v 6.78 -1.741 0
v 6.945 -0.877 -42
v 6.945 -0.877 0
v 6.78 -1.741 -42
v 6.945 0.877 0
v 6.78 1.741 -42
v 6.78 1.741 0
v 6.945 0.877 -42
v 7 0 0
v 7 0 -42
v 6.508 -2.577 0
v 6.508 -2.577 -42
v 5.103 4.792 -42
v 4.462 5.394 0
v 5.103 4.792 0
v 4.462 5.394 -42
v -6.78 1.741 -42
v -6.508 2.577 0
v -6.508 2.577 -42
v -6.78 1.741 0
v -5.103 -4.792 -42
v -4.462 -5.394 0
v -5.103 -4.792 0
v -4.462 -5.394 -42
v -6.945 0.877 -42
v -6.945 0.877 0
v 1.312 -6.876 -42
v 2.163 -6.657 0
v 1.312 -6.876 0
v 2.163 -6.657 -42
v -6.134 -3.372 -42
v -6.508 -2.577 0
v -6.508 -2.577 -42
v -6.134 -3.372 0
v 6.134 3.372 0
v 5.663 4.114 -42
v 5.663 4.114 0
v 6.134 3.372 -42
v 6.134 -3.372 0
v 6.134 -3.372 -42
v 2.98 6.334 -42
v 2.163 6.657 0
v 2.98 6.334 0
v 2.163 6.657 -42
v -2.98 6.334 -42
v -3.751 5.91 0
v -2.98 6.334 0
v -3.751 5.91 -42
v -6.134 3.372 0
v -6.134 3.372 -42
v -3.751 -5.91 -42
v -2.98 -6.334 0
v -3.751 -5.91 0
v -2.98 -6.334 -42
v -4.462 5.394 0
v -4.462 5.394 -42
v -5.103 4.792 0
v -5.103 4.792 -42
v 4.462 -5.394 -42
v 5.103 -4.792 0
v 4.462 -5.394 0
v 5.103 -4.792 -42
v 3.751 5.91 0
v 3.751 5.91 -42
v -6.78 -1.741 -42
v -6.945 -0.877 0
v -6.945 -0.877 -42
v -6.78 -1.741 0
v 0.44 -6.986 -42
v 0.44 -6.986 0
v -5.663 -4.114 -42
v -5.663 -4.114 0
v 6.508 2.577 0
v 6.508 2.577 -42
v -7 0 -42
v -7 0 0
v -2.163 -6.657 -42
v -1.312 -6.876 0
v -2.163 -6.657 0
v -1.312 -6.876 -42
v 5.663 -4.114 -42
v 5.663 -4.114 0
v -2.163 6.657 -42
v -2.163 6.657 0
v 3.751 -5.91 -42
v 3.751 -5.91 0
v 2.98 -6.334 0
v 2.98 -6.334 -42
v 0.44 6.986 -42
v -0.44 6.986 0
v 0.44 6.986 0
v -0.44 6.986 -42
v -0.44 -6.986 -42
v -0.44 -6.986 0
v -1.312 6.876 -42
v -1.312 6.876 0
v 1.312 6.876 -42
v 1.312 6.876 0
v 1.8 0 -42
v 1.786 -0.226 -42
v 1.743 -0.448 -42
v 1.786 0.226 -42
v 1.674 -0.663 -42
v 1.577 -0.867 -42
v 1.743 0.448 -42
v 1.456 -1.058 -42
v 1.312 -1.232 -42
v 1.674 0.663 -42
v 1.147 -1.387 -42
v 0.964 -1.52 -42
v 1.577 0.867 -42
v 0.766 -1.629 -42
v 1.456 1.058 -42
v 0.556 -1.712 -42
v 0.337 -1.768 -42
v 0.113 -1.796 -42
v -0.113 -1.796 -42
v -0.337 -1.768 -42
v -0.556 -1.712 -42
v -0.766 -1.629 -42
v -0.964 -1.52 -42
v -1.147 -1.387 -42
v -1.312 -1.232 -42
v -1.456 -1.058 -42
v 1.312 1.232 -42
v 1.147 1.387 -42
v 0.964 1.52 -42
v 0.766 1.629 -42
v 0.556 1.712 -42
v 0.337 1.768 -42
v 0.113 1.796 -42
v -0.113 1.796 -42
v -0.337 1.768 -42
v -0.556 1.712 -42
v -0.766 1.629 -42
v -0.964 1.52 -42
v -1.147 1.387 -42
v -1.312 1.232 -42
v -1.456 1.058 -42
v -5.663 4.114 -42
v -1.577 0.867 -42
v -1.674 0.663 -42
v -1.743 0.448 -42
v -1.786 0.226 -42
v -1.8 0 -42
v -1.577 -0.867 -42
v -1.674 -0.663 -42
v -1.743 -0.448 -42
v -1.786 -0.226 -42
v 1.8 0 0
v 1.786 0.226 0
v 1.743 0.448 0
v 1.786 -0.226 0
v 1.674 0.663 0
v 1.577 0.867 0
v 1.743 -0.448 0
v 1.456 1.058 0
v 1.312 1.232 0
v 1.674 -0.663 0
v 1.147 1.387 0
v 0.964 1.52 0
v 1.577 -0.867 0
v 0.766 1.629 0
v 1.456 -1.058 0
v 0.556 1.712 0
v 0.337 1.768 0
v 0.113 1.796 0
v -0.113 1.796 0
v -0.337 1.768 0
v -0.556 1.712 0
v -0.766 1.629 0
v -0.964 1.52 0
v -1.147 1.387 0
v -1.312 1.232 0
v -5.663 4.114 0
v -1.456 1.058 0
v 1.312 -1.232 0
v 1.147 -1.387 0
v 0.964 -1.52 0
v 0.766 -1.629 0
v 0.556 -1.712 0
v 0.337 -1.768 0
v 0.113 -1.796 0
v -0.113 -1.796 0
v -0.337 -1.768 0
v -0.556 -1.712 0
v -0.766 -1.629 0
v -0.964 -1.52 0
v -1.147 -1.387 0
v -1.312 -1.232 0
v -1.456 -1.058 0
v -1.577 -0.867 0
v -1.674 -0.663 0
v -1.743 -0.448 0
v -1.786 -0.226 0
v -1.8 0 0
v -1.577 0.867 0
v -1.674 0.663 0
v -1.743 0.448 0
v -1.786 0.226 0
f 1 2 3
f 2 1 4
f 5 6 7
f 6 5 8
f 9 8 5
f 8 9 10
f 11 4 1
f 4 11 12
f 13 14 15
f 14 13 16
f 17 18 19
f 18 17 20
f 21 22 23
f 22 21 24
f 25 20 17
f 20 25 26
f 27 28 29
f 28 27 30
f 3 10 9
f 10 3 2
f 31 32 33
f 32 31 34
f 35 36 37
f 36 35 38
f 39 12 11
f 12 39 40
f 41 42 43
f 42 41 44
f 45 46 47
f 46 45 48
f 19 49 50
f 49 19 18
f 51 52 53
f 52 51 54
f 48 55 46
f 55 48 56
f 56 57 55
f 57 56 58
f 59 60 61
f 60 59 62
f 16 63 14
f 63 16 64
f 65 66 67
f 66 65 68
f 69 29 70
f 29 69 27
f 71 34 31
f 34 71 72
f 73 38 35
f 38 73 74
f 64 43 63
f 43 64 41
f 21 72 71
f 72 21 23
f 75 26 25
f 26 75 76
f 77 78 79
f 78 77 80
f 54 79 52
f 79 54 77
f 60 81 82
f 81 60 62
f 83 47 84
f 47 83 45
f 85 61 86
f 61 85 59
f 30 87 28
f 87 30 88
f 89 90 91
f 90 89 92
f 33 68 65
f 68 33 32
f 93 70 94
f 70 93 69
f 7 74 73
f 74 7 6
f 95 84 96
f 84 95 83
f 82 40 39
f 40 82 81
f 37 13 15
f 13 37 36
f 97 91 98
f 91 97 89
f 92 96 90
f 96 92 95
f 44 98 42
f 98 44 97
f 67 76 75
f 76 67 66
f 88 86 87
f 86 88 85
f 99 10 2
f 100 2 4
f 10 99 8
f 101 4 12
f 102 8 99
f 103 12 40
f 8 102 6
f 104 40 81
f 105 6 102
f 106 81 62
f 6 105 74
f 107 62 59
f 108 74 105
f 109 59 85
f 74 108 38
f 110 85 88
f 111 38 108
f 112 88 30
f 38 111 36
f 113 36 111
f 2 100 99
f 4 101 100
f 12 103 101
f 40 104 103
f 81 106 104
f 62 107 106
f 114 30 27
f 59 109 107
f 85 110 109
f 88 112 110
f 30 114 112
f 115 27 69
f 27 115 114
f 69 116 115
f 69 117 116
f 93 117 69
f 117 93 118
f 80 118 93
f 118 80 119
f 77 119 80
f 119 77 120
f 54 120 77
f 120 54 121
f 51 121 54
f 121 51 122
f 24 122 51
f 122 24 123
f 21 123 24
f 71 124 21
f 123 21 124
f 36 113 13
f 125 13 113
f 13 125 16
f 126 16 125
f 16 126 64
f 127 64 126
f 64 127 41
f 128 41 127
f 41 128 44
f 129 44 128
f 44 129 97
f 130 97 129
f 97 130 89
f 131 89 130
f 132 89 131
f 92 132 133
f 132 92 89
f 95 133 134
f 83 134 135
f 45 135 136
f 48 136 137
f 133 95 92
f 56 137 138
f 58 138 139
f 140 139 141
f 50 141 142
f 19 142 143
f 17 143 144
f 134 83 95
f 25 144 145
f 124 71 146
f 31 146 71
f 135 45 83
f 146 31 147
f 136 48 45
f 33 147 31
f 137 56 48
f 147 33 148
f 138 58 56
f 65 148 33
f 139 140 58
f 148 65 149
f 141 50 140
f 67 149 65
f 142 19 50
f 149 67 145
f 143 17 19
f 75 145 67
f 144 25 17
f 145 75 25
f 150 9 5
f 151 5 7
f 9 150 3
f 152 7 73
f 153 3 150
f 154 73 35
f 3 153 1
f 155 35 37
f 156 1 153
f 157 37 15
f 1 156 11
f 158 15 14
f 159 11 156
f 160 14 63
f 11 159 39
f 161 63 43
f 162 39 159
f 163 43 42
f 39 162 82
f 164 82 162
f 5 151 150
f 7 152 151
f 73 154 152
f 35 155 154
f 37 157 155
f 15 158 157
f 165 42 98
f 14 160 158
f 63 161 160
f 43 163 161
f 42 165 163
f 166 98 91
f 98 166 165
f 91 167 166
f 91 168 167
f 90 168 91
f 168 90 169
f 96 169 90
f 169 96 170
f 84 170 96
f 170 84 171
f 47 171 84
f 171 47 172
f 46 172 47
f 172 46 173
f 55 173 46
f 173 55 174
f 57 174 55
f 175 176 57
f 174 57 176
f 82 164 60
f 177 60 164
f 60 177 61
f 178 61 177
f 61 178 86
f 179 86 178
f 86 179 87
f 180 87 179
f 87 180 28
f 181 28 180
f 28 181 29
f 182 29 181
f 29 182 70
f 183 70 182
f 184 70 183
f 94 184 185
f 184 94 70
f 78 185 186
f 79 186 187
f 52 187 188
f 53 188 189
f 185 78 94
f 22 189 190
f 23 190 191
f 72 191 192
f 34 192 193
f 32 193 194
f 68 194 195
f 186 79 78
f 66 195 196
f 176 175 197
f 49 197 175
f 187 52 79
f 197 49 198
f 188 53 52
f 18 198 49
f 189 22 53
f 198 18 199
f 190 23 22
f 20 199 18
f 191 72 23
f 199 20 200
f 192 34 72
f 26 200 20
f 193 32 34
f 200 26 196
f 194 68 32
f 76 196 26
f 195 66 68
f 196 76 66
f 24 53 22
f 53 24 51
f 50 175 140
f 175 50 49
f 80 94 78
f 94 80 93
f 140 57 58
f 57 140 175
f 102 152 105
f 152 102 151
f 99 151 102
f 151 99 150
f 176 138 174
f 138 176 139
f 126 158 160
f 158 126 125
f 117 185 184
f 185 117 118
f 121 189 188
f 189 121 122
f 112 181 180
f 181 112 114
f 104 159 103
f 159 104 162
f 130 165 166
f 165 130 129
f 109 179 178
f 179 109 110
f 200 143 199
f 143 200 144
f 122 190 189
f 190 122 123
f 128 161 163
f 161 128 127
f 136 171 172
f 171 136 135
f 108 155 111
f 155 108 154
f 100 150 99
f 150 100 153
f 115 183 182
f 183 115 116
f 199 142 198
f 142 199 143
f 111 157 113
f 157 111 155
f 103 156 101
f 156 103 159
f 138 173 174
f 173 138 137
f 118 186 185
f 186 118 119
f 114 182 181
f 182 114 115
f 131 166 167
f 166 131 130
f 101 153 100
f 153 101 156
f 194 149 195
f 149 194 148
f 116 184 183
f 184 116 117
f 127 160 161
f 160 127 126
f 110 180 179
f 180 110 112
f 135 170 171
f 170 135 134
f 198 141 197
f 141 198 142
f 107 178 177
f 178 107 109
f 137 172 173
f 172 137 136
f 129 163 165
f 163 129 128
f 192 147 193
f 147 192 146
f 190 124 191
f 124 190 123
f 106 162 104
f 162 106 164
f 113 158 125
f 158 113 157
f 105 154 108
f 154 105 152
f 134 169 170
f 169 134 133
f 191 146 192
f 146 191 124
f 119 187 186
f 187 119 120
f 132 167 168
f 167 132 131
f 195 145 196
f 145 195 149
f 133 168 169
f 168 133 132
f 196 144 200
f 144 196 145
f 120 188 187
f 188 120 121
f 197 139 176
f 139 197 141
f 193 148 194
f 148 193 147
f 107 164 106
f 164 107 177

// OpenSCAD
$fn = 50;


difference() {
	union() {
		translate(v = [0, 0, -42.0000000000]) {
			cylinder(h = 42, r = 7.0000000000);
		}
		cylinder(h = 0, r = 13.0000000000);
	}
	union() {
		#translate(v = [0, 0, -42]) {
			cylinder(h = 42, r = 1.8000000000);
		}
	}
}
